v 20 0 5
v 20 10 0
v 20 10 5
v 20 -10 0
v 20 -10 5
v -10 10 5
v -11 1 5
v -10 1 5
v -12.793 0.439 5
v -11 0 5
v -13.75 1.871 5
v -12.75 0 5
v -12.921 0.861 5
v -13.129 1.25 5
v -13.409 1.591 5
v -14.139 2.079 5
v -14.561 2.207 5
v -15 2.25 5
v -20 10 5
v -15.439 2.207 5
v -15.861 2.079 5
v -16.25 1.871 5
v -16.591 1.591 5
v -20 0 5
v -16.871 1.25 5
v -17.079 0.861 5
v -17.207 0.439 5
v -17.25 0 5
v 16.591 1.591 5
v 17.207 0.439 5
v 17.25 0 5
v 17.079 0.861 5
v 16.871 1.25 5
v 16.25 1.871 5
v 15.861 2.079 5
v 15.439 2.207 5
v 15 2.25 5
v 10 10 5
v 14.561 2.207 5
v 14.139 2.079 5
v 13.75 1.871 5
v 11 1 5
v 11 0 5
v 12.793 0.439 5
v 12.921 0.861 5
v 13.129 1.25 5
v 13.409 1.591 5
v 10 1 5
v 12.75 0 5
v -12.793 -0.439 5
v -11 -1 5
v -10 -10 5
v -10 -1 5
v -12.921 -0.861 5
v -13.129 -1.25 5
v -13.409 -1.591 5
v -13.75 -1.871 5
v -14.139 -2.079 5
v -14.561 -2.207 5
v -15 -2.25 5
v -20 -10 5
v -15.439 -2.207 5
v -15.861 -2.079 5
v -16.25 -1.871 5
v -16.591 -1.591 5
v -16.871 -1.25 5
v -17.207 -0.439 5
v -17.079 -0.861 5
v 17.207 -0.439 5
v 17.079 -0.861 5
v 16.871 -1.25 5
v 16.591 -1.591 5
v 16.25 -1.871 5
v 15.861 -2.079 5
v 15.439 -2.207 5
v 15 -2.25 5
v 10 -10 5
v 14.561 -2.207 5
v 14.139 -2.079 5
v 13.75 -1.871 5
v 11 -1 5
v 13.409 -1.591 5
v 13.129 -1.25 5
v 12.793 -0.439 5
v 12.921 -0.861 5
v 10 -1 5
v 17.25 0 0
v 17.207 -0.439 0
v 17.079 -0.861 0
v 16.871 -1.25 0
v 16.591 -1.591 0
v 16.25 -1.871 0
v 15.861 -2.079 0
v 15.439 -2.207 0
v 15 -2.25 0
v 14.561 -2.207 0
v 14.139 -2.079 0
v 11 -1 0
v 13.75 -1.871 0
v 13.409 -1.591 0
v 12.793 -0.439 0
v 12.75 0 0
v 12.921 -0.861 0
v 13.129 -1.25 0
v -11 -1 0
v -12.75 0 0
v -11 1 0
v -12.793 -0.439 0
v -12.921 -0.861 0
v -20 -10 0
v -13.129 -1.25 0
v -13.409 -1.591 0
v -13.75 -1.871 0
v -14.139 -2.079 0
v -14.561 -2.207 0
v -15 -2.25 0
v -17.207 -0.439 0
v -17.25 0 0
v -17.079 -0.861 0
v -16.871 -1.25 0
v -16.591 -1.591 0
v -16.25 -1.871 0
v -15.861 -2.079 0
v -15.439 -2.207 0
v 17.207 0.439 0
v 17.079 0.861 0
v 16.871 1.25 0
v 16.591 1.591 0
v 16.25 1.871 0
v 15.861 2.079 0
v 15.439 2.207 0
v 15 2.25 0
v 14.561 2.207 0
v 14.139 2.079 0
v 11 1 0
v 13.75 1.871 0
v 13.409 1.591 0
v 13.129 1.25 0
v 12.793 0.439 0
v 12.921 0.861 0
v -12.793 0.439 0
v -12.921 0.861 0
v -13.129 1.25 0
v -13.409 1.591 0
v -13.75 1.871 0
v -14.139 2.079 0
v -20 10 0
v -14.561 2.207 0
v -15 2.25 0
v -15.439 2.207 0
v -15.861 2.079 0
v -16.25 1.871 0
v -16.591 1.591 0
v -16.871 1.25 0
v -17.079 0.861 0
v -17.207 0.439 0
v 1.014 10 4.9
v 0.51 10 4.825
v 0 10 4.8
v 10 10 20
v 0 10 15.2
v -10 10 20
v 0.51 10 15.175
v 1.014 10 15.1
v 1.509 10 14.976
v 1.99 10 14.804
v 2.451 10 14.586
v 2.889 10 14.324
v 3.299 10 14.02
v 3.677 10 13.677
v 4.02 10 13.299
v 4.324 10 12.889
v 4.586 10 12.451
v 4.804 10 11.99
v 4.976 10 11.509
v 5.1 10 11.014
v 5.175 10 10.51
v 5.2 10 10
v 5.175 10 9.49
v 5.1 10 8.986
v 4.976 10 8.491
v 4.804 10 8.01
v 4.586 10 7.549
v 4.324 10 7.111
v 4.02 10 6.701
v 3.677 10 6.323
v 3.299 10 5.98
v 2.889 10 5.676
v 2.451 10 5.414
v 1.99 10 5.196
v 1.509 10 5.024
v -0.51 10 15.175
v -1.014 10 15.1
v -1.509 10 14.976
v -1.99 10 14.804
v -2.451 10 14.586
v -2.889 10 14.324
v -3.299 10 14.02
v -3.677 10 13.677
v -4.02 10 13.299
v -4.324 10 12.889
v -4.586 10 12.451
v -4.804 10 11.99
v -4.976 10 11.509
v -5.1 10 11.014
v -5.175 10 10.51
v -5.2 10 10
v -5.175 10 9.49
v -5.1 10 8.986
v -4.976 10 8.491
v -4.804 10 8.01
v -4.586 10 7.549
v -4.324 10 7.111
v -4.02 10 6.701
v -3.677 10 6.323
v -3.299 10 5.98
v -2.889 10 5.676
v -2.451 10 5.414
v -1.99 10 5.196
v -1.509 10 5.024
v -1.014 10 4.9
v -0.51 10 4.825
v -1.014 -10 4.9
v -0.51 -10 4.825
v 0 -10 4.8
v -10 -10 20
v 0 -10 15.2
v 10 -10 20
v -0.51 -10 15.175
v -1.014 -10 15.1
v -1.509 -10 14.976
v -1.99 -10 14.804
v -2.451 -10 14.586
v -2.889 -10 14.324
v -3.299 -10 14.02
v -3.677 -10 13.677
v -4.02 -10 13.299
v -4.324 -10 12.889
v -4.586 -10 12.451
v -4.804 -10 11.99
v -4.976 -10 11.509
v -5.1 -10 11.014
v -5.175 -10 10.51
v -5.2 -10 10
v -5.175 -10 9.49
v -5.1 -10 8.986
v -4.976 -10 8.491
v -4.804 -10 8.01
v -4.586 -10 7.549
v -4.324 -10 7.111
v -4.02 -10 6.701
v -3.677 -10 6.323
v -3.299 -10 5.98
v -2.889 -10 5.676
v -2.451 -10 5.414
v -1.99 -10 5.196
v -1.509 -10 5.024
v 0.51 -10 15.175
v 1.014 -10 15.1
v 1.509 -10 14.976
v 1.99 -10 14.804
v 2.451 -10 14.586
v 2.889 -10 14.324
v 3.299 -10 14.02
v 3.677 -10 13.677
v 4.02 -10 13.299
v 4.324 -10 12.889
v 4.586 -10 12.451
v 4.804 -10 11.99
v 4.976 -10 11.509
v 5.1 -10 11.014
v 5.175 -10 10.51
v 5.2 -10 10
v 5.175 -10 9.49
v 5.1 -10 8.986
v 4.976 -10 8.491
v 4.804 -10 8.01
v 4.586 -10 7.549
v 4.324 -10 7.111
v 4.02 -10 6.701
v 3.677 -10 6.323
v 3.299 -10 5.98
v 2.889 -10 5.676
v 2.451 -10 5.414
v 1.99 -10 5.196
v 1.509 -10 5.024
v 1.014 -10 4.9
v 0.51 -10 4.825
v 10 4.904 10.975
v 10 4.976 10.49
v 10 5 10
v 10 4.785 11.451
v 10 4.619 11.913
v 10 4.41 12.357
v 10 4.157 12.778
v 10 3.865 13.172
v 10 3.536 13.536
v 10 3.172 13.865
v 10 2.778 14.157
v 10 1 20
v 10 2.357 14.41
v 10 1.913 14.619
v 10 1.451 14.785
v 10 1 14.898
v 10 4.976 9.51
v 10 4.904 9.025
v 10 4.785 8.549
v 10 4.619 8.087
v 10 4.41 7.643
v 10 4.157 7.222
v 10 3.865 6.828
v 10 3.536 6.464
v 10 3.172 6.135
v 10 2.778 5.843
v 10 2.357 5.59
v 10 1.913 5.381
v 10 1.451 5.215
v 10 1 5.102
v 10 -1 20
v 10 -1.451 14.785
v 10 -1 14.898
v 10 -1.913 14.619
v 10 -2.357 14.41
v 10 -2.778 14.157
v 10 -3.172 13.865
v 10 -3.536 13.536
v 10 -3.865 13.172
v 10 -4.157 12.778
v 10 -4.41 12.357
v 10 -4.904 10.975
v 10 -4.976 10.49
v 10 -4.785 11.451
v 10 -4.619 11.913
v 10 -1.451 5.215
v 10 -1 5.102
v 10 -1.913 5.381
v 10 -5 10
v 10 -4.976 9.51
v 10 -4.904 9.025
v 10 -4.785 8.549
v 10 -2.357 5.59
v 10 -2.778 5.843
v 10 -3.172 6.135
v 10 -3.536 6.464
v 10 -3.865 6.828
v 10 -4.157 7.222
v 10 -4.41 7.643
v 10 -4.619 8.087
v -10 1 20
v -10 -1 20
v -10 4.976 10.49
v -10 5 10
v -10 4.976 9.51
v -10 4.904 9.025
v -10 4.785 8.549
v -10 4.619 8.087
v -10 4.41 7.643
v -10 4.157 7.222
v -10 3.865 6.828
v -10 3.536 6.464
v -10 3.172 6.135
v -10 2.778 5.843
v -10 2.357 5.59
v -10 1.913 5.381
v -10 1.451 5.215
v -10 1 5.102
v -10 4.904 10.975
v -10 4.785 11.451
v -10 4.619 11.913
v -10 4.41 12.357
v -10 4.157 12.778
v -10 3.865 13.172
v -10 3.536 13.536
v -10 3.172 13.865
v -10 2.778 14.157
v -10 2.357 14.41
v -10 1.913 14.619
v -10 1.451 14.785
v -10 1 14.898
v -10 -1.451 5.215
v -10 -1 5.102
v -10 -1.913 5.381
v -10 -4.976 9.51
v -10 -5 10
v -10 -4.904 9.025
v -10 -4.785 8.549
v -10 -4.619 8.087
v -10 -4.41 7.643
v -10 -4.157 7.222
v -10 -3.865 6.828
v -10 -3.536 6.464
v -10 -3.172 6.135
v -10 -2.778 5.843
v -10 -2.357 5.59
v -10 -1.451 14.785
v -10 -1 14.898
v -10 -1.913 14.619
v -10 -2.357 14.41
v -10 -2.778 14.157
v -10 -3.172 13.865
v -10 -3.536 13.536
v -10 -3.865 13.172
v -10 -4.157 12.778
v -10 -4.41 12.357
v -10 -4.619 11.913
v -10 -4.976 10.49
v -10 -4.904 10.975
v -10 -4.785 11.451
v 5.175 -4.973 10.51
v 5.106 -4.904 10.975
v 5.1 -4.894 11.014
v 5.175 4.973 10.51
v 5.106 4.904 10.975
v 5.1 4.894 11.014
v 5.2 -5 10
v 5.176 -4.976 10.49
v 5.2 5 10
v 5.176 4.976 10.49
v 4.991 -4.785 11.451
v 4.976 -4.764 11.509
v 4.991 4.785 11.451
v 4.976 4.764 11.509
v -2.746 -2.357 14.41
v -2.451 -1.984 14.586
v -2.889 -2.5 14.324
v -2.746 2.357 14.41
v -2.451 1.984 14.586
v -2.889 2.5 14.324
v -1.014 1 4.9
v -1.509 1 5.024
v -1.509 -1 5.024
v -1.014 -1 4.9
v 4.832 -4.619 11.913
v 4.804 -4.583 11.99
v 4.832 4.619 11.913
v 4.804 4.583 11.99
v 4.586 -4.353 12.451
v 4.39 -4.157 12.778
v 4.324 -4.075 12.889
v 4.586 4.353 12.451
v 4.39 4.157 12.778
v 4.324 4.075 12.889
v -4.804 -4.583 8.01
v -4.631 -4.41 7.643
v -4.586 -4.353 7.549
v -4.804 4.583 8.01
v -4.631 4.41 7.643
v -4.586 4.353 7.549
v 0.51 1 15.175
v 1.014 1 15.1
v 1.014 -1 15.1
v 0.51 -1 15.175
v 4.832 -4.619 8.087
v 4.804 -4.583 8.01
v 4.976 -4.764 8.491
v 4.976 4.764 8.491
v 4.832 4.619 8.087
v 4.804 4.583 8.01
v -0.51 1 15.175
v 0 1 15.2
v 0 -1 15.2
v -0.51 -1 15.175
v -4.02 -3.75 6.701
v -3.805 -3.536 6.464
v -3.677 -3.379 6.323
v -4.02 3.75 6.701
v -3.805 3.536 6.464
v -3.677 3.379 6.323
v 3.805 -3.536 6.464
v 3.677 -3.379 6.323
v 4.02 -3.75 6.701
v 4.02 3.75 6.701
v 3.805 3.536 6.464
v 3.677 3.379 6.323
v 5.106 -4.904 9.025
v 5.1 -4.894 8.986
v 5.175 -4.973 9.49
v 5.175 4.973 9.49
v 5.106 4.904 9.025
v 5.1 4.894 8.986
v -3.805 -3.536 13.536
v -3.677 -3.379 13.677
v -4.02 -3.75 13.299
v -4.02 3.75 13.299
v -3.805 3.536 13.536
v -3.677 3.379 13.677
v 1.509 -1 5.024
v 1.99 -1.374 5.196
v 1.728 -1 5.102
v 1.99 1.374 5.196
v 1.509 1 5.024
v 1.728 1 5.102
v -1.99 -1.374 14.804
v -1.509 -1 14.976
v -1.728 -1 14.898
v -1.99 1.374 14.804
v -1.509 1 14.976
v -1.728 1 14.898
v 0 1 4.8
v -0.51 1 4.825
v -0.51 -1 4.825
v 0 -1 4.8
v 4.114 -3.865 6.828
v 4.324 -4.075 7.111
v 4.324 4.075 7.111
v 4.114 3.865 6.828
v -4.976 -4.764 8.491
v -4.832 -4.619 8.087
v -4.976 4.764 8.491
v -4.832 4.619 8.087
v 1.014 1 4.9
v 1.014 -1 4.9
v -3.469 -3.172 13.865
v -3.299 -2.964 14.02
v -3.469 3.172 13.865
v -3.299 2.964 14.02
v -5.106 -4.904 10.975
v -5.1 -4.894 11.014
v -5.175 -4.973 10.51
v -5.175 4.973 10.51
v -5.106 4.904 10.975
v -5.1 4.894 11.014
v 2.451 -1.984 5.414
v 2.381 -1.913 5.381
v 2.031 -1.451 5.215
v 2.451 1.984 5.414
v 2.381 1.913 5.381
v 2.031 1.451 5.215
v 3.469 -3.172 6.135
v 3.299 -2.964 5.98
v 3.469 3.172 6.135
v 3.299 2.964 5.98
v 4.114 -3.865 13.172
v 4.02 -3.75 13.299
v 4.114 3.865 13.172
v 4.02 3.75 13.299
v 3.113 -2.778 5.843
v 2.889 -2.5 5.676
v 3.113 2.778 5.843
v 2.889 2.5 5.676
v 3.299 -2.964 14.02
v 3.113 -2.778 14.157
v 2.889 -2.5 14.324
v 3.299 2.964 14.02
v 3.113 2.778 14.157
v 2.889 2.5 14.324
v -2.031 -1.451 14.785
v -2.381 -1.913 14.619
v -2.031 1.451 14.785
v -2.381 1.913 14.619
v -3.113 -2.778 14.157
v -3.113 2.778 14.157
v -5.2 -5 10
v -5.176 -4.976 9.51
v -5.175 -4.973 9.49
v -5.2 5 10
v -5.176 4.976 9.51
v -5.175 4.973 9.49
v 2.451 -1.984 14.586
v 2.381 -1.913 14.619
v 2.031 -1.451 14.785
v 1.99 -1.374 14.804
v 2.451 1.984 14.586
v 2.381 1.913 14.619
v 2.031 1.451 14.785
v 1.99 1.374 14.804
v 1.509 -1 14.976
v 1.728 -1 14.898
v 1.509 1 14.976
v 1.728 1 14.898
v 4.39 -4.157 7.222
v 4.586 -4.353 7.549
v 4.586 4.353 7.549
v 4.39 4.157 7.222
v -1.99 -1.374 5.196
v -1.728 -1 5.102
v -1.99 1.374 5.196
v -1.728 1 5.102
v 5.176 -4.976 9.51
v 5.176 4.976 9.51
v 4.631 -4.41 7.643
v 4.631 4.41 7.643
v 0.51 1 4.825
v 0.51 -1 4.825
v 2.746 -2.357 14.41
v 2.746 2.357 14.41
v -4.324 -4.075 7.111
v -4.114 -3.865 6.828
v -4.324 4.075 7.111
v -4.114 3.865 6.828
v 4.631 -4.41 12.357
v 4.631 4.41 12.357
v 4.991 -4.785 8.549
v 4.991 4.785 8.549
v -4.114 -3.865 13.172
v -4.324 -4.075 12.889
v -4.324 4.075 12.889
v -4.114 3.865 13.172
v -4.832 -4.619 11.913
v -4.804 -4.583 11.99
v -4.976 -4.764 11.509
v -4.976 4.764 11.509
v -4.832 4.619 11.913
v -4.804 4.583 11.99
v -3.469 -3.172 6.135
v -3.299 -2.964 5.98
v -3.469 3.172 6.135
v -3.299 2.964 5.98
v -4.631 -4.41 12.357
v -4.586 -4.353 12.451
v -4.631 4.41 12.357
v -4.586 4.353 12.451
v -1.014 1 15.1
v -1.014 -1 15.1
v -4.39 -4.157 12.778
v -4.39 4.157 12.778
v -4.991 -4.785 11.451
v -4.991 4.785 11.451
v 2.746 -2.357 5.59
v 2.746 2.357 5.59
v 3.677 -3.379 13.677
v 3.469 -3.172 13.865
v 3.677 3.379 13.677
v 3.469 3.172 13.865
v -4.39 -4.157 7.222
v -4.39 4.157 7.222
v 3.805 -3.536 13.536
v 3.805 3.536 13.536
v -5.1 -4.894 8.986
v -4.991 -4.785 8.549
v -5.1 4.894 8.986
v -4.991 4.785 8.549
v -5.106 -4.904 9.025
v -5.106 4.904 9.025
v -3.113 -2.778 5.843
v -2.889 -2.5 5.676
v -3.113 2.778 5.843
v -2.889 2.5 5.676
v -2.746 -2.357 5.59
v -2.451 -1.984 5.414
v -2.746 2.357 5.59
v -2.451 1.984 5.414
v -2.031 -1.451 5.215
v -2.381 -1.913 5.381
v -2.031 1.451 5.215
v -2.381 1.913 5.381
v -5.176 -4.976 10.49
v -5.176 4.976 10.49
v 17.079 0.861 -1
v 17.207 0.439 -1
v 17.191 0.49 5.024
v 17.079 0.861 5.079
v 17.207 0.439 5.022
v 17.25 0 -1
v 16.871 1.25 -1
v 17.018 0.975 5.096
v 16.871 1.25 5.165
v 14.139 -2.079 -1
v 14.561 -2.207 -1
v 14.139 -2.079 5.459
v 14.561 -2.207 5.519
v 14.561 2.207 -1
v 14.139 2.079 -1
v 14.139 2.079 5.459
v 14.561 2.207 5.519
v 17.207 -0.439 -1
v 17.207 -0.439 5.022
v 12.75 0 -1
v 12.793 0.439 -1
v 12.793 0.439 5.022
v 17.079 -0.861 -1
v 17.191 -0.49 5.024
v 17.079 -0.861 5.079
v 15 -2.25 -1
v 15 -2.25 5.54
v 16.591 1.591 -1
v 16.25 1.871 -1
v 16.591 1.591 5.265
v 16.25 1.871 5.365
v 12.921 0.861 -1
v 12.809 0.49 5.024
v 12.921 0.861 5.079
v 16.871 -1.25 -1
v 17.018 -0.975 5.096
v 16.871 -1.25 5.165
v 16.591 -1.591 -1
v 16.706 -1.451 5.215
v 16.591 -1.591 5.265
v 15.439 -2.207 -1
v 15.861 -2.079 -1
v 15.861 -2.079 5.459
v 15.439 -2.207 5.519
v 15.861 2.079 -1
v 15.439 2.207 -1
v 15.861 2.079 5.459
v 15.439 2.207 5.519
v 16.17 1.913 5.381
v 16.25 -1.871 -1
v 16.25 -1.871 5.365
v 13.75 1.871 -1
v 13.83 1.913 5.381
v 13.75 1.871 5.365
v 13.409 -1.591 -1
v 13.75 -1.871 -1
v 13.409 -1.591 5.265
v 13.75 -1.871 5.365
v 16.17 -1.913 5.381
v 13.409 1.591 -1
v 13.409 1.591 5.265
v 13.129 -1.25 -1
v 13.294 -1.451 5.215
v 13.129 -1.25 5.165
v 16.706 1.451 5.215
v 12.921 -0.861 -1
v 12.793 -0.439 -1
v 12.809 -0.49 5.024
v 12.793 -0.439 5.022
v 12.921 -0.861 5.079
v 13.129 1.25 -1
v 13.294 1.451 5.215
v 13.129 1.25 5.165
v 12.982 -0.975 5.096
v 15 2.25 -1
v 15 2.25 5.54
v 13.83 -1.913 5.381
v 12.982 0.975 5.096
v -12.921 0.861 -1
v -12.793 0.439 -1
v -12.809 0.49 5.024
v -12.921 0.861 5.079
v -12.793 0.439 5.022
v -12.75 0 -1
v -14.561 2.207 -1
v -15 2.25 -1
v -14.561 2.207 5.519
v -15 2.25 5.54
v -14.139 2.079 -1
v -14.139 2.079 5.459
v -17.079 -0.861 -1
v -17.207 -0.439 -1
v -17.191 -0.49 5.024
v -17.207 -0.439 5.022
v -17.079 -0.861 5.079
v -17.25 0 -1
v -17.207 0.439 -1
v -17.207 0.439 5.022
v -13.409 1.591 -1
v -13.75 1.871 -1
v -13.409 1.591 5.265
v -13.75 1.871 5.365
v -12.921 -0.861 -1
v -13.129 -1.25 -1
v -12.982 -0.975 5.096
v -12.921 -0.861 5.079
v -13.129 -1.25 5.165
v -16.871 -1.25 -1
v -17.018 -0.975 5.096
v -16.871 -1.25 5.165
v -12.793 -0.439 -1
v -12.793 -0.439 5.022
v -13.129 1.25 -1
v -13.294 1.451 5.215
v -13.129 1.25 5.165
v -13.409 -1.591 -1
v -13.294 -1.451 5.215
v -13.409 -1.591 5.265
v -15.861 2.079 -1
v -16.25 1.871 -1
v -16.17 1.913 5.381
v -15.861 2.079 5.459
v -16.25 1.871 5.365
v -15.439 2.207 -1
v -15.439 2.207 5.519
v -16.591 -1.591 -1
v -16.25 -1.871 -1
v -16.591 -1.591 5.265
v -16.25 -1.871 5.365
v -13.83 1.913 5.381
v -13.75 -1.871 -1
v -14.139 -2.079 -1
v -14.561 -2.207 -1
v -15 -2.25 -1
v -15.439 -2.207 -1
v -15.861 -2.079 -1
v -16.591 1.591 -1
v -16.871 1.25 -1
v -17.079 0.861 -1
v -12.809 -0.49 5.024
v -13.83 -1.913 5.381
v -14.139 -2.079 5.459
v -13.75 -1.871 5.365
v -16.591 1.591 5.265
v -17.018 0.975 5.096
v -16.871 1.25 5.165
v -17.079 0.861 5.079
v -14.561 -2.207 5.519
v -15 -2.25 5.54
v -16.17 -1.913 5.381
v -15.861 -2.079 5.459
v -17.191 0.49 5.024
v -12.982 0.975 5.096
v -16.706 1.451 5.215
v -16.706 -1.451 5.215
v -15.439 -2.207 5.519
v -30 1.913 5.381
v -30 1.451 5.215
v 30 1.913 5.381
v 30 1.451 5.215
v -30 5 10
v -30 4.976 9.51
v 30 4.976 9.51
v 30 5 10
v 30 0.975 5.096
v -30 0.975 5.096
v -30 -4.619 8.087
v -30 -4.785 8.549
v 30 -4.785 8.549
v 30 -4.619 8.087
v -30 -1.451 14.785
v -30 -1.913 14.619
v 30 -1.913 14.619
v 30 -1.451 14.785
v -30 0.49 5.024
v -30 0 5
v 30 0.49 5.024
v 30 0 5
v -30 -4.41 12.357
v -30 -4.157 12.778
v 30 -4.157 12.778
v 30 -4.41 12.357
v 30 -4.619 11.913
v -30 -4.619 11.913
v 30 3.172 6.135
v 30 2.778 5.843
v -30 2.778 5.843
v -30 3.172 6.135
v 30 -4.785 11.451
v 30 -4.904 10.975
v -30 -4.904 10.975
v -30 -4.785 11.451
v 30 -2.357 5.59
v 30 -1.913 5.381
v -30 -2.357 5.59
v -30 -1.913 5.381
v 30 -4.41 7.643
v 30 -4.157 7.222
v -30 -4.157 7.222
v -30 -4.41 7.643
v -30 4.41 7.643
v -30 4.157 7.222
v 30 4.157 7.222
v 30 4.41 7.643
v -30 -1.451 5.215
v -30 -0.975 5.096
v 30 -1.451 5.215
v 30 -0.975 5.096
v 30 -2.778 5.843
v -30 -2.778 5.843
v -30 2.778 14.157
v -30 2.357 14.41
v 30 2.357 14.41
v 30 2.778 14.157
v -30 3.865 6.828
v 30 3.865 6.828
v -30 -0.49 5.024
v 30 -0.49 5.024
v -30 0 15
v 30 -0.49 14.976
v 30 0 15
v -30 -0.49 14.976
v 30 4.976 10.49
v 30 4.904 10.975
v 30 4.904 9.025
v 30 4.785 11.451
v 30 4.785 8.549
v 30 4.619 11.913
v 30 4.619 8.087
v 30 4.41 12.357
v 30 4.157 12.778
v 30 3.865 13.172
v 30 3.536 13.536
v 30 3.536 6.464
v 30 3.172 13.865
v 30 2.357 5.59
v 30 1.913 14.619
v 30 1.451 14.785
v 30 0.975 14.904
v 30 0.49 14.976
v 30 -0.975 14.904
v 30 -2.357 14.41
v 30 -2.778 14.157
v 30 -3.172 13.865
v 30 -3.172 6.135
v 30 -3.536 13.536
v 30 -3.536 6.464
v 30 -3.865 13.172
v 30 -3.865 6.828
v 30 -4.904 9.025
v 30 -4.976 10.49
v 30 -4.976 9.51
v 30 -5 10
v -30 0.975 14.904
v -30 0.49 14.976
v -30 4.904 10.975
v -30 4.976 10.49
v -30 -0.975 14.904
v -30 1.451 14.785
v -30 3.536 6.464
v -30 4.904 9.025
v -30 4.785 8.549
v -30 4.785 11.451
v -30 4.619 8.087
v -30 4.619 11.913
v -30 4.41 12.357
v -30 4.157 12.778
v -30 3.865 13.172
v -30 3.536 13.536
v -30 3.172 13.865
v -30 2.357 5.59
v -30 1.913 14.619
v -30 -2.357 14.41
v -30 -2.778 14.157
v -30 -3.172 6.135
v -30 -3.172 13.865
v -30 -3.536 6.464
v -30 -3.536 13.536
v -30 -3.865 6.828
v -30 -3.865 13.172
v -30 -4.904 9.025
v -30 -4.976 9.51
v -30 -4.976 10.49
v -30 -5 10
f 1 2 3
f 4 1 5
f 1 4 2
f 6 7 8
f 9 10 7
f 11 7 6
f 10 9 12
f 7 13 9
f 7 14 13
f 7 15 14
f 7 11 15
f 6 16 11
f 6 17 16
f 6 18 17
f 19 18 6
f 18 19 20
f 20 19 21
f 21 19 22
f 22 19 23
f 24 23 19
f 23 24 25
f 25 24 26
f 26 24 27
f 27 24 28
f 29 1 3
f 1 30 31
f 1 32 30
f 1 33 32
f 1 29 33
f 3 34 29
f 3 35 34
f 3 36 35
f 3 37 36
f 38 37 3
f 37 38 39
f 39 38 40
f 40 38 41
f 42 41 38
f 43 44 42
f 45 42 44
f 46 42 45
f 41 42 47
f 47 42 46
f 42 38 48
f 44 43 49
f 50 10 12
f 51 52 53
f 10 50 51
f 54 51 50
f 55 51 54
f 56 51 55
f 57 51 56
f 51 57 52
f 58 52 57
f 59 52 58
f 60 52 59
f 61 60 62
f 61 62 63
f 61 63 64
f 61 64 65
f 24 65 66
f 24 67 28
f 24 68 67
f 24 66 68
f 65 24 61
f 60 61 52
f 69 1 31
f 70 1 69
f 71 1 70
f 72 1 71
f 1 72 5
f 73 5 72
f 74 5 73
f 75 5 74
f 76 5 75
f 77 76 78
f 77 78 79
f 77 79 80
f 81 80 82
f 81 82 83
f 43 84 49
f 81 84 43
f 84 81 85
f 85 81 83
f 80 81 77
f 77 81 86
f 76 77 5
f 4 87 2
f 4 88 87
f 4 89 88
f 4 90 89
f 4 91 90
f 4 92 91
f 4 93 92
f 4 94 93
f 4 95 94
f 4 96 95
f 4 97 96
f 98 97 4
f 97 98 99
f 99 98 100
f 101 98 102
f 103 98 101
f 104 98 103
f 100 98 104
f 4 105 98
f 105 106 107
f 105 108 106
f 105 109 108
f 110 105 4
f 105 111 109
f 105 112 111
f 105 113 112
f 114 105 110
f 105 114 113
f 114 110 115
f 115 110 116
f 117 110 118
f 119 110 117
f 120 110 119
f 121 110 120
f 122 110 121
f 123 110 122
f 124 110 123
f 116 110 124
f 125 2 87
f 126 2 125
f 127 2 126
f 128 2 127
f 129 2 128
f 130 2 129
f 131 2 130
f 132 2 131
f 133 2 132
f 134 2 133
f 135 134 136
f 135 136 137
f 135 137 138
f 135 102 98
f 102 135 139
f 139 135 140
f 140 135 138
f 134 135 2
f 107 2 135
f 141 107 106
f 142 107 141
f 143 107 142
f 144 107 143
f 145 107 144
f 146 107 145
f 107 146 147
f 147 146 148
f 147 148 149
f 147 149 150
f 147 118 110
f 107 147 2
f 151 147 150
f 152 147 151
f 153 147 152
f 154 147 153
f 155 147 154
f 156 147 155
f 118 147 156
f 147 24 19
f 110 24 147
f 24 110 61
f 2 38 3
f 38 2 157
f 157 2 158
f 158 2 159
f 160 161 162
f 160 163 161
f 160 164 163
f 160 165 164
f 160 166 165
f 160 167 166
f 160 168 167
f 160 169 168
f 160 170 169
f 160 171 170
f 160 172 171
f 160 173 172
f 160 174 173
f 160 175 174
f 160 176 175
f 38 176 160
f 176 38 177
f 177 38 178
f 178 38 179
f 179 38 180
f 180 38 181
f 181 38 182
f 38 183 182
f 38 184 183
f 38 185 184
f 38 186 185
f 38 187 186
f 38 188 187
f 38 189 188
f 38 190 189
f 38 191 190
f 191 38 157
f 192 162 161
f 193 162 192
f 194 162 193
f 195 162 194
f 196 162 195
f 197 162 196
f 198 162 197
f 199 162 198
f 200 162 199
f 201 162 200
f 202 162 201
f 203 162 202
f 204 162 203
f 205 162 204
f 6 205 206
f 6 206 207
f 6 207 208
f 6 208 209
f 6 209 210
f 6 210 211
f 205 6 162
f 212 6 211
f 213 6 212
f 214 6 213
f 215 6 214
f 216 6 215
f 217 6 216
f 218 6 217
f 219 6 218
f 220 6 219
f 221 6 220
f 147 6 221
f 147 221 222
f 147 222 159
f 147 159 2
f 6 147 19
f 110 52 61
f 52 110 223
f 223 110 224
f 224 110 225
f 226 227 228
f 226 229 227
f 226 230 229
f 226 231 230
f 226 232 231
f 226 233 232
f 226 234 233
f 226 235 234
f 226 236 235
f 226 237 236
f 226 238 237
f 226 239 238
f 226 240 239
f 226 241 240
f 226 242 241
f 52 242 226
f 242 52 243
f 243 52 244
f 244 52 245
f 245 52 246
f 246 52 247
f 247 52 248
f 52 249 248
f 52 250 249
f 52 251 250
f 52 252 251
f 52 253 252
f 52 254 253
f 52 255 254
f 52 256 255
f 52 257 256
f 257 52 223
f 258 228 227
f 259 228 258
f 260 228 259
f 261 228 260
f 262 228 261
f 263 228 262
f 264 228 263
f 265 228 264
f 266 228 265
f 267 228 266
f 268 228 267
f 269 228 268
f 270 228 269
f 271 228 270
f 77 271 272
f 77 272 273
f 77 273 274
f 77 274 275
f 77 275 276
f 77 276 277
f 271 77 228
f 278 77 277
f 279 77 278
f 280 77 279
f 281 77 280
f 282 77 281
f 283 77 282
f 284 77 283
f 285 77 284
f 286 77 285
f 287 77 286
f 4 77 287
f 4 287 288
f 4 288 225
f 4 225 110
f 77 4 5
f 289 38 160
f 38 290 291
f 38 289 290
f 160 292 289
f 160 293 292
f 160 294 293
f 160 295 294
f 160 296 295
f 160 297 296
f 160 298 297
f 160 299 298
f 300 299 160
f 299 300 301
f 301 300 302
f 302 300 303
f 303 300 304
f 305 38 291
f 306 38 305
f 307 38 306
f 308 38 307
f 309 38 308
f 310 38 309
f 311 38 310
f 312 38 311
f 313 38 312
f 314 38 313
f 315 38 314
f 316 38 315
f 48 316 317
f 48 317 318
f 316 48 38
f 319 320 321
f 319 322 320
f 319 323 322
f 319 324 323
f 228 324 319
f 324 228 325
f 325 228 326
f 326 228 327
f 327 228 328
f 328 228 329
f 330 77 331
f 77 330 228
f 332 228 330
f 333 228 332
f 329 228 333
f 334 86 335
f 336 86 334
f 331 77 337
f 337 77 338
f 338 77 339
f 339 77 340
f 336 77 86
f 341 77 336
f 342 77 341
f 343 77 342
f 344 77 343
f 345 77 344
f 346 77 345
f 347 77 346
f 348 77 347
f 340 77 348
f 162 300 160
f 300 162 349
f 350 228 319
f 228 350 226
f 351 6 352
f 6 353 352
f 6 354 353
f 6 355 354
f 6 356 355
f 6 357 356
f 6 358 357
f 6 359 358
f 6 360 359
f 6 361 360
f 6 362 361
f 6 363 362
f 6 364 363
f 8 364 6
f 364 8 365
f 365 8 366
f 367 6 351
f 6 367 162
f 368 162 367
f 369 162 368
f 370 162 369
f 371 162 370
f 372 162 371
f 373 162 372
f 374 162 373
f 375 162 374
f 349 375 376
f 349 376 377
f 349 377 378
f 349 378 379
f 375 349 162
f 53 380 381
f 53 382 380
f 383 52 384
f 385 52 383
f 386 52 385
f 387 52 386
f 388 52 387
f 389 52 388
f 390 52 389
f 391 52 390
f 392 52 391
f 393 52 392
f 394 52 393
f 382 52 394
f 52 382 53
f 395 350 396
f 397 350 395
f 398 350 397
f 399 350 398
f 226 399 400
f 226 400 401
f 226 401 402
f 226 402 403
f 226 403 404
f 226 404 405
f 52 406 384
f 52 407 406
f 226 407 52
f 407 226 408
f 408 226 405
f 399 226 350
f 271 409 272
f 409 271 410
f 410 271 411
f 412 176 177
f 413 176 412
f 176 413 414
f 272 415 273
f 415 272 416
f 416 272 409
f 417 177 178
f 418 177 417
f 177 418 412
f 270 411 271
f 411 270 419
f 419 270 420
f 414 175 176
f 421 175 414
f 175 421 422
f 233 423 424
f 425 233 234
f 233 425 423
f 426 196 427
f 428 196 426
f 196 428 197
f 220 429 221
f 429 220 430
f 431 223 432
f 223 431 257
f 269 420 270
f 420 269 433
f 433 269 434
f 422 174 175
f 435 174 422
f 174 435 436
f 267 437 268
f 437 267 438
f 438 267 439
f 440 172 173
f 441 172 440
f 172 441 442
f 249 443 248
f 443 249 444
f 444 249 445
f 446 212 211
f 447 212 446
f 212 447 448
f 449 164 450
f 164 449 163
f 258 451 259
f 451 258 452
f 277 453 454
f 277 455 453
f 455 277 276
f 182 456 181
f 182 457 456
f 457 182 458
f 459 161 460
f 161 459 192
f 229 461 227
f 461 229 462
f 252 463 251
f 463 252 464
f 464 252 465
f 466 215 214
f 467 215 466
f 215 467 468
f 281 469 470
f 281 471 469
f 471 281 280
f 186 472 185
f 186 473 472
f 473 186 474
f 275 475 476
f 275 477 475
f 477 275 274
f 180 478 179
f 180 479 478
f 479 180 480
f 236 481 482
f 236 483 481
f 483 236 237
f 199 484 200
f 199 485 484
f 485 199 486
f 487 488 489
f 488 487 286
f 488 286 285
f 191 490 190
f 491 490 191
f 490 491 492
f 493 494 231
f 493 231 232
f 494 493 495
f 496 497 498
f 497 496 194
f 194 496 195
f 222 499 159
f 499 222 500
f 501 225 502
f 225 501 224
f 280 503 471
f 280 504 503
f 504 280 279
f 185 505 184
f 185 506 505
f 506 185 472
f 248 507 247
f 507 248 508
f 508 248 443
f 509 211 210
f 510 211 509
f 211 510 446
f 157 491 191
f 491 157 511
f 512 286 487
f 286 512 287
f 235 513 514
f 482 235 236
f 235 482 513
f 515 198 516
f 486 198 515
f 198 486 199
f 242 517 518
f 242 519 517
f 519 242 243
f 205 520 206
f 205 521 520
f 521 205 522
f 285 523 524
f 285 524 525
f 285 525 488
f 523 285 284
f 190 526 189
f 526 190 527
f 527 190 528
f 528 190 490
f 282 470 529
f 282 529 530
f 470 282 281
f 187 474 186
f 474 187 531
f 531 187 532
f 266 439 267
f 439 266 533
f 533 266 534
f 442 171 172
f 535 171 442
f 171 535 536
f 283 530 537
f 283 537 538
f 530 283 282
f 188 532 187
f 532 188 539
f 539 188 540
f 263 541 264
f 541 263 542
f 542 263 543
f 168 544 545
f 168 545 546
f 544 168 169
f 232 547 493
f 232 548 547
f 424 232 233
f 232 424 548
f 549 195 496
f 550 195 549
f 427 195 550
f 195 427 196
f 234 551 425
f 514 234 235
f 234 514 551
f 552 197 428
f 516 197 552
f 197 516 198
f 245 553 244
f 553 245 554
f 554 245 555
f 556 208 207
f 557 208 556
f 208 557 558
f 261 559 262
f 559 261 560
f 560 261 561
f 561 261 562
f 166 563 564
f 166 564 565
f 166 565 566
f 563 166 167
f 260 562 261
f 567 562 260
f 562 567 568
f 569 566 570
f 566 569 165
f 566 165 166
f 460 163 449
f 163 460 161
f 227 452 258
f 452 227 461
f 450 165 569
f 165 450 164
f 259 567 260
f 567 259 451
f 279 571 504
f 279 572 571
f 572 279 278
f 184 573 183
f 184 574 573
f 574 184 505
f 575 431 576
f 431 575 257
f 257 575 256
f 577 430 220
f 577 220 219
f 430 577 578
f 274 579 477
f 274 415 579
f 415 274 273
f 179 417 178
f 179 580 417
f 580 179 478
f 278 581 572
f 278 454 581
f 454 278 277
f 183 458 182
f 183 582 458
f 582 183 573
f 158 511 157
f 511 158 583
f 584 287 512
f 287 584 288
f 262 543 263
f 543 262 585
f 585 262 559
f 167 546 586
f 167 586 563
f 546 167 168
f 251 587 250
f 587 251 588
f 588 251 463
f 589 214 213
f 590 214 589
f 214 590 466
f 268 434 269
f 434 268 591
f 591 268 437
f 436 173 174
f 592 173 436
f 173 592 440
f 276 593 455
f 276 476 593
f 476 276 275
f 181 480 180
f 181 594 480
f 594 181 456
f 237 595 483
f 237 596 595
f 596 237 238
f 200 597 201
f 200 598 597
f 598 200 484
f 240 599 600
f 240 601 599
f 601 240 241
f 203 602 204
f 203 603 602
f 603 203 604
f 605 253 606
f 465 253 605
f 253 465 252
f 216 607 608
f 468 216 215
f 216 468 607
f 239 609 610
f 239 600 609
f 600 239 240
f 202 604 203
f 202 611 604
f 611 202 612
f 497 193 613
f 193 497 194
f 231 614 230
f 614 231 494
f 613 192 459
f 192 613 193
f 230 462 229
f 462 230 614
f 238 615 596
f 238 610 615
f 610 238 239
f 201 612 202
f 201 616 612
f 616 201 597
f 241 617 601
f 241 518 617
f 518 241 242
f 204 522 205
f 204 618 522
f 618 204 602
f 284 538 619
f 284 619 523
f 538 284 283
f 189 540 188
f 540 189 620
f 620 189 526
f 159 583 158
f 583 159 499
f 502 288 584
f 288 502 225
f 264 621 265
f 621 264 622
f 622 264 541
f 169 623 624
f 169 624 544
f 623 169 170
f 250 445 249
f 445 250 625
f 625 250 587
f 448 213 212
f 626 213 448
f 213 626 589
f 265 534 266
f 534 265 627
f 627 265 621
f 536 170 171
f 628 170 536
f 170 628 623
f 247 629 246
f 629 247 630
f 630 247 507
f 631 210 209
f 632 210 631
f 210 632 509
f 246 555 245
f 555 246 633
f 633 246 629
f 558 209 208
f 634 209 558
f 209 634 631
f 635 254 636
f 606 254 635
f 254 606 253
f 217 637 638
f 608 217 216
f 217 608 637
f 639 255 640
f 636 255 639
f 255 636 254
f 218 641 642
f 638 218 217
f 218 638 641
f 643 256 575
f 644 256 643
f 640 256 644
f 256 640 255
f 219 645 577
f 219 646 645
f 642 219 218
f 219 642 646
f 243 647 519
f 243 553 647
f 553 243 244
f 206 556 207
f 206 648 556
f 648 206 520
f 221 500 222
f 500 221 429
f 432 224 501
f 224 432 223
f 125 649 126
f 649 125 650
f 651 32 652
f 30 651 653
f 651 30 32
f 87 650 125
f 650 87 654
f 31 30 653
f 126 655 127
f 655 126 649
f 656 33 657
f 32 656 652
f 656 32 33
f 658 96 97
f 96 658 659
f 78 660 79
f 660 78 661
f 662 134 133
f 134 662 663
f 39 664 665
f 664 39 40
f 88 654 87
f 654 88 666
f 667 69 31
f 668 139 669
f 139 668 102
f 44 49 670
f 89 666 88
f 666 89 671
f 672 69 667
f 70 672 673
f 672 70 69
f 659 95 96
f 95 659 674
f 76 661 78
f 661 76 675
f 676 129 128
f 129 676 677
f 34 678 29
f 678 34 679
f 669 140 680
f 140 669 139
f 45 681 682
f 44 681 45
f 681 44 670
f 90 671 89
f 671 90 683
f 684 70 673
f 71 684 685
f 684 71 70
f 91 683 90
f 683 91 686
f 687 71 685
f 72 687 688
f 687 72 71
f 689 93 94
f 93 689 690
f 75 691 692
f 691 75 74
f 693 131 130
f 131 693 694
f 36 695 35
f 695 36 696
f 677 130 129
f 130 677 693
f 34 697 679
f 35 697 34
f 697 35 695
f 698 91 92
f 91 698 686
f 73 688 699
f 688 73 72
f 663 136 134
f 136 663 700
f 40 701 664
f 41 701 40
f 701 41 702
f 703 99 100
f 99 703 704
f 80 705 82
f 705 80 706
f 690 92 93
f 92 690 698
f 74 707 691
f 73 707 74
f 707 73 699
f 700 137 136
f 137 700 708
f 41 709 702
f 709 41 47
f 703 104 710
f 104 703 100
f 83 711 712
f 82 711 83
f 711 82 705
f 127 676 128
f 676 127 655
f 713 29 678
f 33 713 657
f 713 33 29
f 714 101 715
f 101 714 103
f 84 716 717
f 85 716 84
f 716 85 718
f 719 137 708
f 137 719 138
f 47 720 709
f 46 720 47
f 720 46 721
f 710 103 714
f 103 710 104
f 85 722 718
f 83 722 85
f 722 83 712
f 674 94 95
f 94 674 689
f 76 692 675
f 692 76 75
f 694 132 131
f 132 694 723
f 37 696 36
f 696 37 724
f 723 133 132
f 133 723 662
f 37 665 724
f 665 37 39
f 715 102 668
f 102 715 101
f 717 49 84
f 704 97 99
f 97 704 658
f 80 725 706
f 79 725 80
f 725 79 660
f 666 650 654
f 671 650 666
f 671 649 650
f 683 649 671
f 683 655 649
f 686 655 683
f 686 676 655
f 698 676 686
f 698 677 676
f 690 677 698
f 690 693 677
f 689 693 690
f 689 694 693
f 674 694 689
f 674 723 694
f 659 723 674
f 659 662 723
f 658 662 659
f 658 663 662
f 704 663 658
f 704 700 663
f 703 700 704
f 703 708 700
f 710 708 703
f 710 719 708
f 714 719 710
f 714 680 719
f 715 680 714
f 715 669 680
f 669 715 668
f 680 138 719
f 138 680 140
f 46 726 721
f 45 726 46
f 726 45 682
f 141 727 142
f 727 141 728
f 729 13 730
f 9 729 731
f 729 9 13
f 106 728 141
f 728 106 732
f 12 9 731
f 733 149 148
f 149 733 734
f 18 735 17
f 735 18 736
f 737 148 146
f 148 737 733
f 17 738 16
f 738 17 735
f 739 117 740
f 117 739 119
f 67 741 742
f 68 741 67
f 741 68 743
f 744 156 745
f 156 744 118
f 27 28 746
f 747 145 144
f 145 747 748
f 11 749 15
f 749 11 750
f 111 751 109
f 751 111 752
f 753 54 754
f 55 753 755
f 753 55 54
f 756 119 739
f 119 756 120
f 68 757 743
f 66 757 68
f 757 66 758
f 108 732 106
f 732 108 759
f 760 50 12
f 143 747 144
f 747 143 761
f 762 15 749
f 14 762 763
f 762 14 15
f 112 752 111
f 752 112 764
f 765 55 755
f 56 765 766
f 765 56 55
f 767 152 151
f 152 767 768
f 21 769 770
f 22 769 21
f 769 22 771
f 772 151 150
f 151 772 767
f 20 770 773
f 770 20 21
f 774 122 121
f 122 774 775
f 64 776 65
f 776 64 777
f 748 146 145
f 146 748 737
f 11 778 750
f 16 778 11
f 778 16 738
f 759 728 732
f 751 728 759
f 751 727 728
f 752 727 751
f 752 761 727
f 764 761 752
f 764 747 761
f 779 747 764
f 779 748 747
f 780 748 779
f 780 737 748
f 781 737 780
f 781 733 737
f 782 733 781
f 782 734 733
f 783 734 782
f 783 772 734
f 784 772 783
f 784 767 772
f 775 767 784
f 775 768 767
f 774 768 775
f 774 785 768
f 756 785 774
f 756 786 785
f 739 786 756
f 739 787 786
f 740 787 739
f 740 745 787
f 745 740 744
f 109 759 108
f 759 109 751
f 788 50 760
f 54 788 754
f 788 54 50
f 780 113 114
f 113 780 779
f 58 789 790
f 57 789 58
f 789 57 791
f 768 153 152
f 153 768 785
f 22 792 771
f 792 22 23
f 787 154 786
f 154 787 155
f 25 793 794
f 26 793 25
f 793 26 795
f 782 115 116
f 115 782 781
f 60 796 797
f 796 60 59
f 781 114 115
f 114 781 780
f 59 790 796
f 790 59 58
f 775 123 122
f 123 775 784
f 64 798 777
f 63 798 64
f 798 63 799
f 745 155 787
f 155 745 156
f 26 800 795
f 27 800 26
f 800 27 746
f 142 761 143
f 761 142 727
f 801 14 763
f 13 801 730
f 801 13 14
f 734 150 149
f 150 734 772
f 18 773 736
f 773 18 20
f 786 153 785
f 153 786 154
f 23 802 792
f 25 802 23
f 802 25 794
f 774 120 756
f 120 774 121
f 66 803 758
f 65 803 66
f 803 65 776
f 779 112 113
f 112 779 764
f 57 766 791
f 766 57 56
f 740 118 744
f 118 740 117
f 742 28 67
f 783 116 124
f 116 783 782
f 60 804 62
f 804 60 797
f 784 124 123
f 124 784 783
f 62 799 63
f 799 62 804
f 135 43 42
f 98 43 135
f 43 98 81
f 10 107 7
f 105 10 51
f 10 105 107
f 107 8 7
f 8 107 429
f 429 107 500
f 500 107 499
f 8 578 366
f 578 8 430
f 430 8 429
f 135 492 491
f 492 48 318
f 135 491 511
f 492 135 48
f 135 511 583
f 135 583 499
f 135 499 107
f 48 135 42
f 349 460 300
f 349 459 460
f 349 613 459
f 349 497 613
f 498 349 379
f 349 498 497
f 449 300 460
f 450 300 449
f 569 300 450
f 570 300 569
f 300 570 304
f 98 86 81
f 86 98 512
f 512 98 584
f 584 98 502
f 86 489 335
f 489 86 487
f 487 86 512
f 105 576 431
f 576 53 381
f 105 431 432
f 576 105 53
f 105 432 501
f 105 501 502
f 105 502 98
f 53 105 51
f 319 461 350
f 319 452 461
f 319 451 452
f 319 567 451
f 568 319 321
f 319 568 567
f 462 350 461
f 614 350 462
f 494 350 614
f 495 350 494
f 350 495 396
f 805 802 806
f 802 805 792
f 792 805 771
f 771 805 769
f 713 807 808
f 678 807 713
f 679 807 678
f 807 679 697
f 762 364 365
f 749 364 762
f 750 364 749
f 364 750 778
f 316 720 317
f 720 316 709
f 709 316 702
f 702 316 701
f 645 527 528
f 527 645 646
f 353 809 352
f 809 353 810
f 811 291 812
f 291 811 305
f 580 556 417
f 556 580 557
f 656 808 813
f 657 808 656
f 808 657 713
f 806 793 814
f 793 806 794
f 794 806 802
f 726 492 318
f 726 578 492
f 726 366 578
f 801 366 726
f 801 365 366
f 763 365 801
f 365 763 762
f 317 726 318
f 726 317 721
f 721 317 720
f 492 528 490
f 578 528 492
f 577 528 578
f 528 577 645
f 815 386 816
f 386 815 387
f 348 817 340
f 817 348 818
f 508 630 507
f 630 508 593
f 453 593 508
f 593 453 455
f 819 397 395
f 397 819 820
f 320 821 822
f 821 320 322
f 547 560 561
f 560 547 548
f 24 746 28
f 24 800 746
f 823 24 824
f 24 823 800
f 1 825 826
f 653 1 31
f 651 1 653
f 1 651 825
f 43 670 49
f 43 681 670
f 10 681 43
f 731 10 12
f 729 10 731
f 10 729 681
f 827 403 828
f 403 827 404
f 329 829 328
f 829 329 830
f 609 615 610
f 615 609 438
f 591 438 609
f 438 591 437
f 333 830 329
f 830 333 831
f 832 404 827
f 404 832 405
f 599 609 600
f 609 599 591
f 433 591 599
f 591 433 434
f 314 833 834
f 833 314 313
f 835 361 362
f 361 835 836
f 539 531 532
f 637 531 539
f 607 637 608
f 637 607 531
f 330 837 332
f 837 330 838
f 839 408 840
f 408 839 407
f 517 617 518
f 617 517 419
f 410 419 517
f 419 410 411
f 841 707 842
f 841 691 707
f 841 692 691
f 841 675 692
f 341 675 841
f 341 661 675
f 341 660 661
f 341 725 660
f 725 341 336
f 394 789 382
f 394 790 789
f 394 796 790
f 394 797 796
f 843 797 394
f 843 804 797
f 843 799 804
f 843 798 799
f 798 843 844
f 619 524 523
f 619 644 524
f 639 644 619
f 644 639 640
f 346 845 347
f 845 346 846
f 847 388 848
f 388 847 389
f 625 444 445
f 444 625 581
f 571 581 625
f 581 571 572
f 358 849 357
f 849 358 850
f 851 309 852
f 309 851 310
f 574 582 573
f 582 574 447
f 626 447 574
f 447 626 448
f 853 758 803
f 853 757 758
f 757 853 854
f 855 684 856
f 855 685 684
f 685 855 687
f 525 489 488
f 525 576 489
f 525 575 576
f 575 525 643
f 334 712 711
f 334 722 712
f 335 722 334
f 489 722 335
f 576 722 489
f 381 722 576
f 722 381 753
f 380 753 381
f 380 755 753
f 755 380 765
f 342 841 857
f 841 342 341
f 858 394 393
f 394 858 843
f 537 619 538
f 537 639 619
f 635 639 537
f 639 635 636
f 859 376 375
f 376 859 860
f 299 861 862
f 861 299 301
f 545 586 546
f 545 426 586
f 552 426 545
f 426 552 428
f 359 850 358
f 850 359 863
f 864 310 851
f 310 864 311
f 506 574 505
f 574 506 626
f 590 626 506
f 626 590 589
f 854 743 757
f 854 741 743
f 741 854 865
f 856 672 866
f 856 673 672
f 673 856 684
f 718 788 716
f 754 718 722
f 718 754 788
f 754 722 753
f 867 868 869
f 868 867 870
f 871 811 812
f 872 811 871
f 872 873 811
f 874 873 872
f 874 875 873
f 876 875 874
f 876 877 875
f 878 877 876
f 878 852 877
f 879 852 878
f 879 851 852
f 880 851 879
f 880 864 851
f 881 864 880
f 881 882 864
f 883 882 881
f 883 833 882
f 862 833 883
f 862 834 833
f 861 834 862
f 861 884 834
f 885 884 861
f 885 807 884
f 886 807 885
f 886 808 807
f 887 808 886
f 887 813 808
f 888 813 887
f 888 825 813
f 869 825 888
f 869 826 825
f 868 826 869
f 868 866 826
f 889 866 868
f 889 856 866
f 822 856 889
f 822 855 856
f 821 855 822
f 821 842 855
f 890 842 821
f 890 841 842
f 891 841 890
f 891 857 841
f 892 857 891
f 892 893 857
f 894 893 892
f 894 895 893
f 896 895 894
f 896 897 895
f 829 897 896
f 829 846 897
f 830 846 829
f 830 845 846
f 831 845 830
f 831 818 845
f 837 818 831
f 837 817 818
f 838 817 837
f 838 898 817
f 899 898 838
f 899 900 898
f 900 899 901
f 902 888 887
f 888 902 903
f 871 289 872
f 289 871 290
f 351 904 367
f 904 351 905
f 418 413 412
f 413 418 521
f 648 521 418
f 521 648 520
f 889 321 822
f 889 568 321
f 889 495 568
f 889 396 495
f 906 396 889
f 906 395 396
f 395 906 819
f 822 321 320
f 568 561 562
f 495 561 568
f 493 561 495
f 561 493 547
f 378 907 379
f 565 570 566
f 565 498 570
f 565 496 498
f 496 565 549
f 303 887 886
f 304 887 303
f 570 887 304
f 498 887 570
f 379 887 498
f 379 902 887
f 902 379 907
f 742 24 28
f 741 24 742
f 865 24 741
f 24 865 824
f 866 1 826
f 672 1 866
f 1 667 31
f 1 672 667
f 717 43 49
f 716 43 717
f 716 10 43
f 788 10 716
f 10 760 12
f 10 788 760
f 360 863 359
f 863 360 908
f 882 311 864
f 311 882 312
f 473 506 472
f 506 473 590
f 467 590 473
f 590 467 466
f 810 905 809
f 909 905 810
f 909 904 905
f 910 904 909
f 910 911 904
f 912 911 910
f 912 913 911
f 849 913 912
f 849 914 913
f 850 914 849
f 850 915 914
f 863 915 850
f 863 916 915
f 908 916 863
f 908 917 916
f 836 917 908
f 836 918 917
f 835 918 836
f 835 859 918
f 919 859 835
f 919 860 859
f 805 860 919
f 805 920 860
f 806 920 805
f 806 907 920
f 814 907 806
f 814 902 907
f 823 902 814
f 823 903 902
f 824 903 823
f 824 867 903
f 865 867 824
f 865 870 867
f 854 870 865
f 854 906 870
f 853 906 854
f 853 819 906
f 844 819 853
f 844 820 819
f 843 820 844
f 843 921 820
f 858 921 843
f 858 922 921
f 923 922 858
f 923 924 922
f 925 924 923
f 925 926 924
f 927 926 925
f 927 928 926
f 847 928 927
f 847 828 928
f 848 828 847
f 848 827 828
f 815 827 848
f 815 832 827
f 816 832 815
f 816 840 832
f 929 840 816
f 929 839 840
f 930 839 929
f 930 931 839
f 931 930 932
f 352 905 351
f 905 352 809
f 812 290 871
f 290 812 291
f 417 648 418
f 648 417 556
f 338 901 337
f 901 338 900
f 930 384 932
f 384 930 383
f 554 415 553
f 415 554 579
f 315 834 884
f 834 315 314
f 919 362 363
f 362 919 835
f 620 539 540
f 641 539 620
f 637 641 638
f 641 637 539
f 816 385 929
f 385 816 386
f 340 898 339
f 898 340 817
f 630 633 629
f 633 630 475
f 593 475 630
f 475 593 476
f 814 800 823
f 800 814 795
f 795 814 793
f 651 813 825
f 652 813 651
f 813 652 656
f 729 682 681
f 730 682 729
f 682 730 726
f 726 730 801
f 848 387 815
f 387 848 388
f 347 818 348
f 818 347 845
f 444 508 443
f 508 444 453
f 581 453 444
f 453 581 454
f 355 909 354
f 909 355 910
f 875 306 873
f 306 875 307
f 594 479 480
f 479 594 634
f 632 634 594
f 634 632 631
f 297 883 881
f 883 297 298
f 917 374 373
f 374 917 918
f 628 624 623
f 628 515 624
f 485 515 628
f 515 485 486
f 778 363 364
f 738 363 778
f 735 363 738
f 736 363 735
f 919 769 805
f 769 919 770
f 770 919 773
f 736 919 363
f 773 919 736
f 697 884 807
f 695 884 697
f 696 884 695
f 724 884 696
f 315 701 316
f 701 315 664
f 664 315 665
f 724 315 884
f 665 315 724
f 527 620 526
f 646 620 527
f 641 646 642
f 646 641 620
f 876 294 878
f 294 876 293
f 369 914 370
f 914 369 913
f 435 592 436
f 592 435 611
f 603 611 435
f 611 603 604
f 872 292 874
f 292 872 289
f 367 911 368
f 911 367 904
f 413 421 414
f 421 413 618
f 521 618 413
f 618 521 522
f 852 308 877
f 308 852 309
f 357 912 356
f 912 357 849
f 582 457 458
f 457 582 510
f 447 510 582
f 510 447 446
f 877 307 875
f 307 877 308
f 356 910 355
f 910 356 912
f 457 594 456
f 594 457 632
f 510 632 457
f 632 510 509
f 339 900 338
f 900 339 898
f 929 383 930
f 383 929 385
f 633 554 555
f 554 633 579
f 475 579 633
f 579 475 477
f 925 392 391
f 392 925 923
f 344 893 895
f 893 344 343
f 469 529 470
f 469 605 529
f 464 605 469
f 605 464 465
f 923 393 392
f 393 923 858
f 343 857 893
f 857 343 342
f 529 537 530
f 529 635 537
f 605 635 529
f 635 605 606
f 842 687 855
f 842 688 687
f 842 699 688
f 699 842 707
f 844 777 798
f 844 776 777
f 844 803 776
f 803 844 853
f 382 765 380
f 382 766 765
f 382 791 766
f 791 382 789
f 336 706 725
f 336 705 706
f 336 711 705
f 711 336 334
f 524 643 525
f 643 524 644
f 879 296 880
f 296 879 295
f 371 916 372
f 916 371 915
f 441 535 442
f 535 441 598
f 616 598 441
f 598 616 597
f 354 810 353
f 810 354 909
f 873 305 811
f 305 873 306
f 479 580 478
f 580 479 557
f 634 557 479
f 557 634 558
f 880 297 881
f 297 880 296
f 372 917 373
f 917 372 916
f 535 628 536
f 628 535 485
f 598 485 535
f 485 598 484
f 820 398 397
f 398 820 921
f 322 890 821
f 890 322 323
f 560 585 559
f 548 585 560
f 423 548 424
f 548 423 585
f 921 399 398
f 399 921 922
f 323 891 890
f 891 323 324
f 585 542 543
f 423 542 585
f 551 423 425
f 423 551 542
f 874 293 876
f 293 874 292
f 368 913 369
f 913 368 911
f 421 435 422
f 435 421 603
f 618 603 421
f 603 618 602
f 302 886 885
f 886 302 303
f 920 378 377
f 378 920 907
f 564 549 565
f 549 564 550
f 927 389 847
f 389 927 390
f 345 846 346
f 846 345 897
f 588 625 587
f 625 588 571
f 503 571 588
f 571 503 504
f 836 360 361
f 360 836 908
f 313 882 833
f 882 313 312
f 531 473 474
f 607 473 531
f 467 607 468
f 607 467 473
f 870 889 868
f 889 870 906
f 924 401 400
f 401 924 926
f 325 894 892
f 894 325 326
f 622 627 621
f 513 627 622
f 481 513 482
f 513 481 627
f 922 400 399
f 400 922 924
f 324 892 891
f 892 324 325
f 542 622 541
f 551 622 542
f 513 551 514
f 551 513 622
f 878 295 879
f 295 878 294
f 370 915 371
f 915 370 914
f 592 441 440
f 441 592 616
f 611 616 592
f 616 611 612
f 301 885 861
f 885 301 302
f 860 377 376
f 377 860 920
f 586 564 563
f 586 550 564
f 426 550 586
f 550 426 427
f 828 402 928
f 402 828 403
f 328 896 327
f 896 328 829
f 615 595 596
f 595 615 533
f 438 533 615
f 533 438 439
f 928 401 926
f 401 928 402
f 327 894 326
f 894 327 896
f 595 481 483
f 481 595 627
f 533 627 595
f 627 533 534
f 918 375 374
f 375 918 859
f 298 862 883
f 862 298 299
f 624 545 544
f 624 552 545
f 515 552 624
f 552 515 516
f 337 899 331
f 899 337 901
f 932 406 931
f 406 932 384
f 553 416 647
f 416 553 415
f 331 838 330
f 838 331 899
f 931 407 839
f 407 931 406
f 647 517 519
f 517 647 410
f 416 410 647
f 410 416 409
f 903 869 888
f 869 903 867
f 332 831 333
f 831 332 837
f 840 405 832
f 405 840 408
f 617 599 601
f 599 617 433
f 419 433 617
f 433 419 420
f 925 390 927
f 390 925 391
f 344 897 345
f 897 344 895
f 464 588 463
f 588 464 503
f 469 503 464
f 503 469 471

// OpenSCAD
// Parameters
rod_diameter = 10.0; //[5.0:20.0:0.1]
rod_length = 60.0; //[30.0:120.0:1]
bracket_height = 20.0; //[10.0:40.0:0.5]
fit_clearance = 0.2; //[0.0:0.6:0.05]
wall_thickness = 4.0; //[2.0:8.0:0.5]
base_thickness = 5.0; //[2.5:10.0:0.5]
base_length = 40.0; //[20.0:80.0:1]
base_width = 20.0; //[10.0:40.0:1]
mount_hole_diameter = 4.5; //[3.0:8.0:0.1]
mount_hole_spacing = 30.0; //[15.0:60.0:1]
rod_center_height_from_base = 10.0; //[6.0:25.0:0.5]
clamp_gap = 2.0; //[0.5:6.0:0.5]
overlap = 1.0; //[0.5:2.0:0.1]

// Rod - complete geometry
module rod() {
  color("Silver") {
    cylinder(r=rod_diameter/2, h=rod_length, center=true, $fn=64);
  }
}

// Bracket assembly
module bracket_assembly() {
  color("DimGray") {
    // Mounting base
    translate([0, 0, base_thickness/2])
      cube([base_length, base_width, base_thickness], center=true);

    // Bracket body
    translate([0, 0, bracket_height/2])
      cube([base_width, base_width, bracket_height], center=true);

    // Rod seat or bore
    translate([0, 0, rod_center_height_from_base])
      rotate([90, 0, 0])
      cylinder(r=(rod_diameter/2) + fit_clearance, h=base_width + 2*overlap, center=true, $fn=64);

    // Mounting holes
    translate([mount_hole_spacing/2, 0, base_thickness/2])
      cylinder(r=mount_hole_diameter/2, h=base_thickness + 2*overlap, center=true, $fn=32);
    translate([-mount_hole_spacing/2, 0, base_thickness/2])
      cylinder(r=mount_hole_diameter/2, h=base_thickness + 2*overlap, center=true, $fn=32);

    // Clamp split or retention feature
    translate([0, 0, bracket_height/2])
      cube([base_width + 2*overlap, clamp_gap, bracket_height + 2*overlap], center=true);
  }
}

// Final assembly
module assembly() {
  difference() {
    union() {
      bracket_assembly();
    }
    // Subtract rod bore
    translate([0, 0, rod_center_height_from_base])
      rotate([90, 0, 0])
      cylinder(r=(rod_diameter/2) + fit_clearance, h=base_width + 2*overlap, center=true, $fn=64);

    // Subtract clamp split
    translate([0, 0, bracket_height/2])
      cube([base_width + 2*overlap, clamp_gap, bracket_height + 2*overlap], center=true);
  }
  // Add rod
  translate([0, 0, rod_center_height_from_base])
    rotate([0, 90, 0])
    rod();
}

assembly();
